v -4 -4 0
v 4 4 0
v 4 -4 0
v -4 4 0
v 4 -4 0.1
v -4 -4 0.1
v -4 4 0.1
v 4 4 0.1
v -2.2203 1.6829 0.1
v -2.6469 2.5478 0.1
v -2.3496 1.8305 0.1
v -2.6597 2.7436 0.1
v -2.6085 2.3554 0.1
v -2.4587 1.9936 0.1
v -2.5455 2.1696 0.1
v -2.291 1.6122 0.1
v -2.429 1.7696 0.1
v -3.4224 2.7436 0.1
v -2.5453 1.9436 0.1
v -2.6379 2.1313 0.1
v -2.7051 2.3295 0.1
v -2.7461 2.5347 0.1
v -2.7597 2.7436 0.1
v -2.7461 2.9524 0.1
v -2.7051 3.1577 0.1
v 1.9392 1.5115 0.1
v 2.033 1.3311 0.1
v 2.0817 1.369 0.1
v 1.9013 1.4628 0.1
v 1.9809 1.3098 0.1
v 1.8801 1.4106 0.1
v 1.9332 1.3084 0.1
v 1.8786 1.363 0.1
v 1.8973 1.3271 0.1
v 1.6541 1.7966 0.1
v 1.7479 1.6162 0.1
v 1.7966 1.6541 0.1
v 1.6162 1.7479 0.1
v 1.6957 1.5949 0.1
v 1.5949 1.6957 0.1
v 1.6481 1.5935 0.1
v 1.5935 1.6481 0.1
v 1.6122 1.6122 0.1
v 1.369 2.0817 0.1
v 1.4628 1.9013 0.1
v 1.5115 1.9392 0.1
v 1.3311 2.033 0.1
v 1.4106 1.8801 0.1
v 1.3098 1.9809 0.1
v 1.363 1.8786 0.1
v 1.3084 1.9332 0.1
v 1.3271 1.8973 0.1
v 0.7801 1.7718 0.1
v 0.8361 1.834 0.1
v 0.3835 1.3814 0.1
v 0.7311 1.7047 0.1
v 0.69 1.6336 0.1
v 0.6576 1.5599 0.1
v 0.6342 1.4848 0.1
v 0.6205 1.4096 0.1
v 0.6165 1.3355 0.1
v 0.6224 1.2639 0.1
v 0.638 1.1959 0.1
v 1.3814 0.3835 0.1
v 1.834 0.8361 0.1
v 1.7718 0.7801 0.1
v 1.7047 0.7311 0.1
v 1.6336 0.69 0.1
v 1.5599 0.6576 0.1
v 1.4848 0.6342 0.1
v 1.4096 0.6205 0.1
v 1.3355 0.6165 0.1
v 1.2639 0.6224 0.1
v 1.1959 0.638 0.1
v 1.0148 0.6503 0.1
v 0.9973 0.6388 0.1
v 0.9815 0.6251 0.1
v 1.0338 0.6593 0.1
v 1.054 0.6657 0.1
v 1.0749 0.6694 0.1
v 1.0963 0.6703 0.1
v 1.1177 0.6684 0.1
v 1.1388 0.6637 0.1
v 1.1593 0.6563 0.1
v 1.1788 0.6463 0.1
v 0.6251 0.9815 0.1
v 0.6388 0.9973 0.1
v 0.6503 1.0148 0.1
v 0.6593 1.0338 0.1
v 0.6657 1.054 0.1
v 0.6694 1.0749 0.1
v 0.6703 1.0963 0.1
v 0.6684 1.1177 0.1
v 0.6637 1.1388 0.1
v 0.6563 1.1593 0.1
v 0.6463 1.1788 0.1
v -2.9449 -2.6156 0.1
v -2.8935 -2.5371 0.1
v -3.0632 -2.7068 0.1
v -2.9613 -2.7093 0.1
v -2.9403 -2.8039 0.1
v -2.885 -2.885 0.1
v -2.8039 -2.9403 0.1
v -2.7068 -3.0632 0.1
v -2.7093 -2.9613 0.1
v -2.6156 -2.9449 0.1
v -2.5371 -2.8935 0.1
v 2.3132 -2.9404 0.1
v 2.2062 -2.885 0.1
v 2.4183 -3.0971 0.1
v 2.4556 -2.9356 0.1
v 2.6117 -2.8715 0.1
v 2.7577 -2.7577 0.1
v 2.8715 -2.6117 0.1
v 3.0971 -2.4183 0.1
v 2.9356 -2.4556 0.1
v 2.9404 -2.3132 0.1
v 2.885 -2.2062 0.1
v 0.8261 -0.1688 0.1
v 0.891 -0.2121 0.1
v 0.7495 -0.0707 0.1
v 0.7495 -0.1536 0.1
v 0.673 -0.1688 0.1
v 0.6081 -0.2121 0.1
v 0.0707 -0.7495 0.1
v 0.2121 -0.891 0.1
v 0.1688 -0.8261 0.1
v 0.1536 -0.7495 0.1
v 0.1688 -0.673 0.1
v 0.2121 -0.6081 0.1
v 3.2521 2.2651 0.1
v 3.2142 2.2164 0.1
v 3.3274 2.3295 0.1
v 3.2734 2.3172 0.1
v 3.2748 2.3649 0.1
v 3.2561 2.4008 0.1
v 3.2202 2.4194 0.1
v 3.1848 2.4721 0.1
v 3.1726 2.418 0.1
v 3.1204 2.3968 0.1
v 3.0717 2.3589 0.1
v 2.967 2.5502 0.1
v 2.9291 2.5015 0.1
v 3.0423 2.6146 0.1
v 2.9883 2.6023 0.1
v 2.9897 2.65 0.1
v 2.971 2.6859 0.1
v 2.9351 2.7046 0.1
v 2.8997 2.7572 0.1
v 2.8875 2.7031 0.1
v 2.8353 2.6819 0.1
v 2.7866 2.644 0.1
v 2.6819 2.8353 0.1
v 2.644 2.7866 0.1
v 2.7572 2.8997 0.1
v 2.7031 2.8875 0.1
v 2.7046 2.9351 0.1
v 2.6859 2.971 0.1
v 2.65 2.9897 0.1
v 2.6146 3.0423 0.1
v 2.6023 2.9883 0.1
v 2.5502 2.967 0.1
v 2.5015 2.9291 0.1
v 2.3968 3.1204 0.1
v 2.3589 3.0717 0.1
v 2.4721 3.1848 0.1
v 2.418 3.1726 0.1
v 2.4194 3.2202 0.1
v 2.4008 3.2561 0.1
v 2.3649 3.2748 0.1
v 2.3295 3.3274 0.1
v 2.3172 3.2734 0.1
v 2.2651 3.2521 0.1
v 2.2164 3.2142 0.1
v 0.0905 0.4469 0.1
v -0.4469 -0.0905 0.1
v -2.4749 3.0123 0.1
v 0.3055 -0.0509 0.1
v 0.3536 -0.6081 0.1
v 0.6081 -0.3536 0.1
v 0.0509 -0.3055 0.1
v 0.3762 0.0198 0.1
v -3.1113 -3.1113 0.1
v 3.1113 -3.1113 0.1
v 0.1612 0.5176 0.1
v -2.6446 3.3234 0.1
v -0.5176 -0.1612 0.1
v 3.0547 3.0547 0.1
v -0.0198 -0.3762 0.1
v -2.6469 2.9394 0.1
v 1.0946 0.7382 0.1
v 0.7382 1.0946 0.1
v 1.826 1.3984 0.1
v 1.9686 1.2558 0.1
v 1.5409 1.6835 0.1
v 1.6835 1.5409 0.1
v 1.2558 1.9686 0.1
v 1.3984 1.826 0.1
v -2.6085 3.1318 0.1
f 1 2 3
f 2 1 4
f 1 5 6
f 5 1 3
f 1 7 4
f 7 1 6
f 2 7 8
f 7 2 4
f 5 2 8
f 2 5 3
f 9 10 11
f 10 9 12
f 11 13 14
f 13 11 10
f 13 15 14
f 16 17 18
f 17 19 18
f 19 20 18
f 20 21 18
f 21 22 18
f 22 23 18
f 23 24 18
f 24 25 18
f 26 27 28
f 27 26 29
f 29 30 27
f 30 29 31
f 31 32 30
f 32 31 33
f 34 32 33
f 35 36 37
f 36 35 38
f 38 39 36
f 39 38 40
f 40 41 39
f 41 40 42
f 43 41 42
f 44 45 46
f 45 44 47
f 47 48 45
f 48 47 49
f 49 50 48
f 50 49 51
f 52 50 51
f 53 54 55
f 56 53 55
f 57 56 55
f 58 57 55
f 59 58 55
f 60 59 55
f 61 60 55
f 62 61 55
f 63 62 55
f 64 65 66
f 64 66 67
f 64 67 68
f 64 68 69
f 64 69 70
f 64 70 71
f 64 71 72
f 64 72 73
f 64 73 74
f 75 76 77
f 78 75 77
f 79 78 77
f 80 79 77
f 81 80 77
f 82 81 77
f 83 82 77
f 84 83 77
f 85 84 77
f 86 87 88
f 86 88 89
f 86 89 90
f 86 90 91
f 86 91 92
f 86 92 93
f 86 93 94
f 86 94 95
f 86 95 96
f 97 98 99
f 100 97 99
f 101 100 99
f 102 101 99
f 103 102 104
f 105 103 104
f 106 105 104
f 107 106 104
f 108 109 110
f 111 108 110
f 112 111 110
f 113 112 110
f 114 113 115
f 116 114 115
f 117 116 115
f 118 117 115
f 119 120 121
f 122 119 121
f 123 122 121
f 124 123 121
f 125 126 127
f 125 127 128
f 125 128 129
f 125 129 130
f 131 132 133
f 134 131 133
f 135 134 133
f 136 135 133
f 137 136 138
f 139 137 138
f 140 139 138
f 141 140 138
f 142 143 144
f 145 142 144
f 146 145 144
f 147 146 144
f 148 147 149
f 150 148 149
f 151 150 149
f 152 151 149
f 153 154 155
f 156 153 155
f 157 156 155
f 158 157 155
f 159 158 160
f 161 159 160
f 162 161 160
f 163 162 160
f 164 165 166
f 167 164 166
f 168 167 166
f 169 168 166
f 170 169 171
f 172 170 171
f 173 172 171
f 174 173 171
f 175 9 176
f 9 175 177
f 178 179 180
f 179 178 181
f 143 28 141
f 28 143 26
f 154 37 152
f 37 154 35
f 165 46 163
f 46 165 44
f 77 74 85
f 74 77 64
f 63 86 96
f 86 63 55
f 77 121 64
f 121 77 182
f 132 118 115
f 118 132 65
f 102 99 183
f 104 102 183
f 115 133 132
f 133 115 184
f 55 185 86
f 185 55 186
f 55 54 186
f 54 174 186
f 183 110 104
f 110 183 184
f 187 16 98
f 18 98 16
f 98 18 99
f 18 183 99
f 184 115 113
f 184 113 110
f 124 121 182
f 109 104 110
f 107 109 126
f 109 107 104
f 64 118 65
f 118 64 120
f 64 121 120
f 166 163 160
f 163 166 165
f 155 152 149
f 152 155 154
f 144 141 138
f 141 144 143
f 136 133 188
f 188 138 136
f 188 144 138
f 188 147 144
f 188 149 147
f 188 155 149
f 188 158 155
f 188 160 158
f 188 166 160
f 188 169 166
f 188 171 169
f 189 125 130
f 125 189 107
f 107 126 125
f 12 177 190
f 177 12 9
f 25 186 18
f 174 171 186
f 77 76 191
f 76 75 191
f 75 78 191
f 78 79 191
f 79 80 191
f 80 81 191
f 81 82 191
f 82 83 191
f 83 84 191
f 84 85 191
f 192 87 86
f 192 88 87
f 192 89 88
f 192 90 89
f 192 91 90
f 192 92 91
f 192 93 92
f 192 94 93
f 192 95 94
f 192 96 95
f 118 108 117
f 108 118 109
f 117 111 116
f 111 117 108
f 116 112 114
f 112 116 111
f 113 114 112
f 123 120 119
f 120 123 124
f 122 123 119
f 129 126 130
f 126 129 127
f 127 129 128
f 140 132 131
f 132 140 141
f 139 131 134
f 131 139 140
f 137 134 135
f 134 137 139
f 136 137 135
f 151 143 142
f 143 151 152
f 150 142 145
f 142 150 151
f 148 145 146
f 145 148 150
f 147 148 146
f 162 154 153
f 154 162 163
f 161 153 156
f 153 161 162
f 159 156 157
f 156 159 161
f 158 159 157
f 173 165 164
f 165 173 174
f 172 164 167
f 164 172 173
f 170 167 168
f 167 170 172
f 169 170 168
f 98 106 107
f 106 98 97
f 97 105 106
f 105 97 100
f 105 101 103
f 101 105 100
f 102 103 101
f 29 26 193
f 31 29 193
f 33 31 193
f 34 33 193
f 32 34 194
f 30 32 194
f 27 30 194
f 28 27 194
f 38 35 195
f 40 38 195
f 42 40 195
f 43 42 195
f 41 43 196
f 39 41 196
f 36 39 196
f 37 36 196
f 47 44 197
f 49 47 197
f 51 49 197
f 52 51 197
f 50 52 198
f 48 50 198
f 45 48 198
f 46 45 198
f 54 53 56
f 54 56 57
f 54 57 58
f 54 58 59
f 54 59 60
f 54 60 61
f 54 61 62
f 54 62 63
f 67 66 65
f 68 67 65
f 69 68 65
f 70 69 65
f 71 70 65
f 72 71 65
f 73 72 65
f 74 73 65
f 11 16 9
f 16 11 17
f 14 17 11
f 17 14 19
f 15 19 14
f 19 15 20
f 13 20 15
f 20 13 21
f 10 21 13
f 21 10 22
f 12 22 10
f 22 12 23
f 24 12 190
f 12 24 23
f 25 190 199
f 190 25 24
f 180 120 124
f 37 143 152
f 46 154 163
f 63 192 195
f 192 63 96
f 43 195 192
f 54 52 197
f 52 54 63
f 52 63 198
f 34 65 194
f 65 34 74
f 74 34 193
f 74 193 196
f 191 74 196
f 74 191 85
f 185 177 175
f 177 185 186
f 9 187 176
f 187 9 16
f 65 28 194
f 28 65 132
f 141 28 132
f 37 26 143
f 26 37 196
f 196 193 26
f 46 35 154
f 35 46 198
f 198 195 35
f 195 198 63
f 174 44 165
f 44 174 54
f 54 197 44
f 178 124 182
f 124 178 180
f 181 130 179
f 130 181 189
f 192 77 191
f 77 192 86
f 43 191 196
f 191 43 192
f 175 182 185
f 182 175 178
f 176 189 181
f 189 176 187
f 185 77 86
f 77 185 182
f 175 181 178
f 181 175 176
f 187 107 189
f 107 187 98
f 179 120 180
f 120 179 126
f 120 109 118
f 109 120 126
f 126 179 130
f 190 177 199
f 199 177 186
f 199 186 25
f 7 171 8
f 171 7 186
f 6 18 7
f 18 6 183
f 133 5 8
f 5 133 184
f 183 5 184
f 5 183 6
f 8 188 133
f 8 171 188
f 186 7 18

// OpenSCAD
// file: ../p/48/5-24ndis.scad
use <../../lib.scad>
function ldraw_lib__48__5_24ndis() = [
// 0 Hi-Res Disc Negative 0.2083
// 0 Name: 48\5-24ndis.dat
// 0 Author: Max Martin Richter [MMR1988]
// 0 !LDRAW_ORG 48_Primitive UPDATE 2015-01
// 0 !LICENSE Licensed under CC BY 2.0 and CC BY 4.0 : see CAreadme.txt
// 
// 0 BFC CERTIFY CCW
  [0,"BFC","CERTIFY"],
  [0,"BFC","CCW"],
// 
// 0 !HISTORY 2015-10-11 [PTadmin] Official Update 2015-01
// 
// 
// 3 16 1 0 1 0.9914 0 0.1305 1 0 0
  [3,16,1,0,1,0.9914,0,0.1305,1,0,0],
// 3 16 1 0 1 0.9659 0 0.2588 0.9914 0 0.1305
  [3,16,1,0,1,0.9659,0,0.2588,0.9914,0,0.1305],
// 3 16 1 0 1 0.9239 0 0.3827 0.9659 0 0.2588
  [3,16,1,0,1,0.9239,0,0.3827,0.9659,0,0.2588],
// 3 16 1 0 1 0.866 0 0.5 0.9239 0 0.3827
  [3,16,1,0,1,0.866,0,0.5,0.9239,0,0.3827],
// 3 16 1 0 1 0.7934 0 0.6088 0.866 0 0.5
  [3,16,1,0,1,0.7934,0,0.6088,0.866,0,0.5],
// 3 16 1 0 1 0.7071 0 0.7071 0.7934 0 0.6088
  [3,16,1,0,1,0.7071,0,0.7071,0.7934,0,0.6088],
// 3 16 1 0 1 0.6088 0 0.7934 0.7071 0 0.7071
  [3,16,1,0,1,0.6088,0,0.7934,0.7071,0,0.7071],
// 3 16 1 0 1 0.5 0 0.866 0.6088 0 0.7934
  [3,16,1,0,1,0.5,0,0.866,0.6088,0,0.7934],
// 3 16 1 0 1 0.3827 0 0.9239 0.5 0 0.866
  [3,16,1,0,1,0.3827,0,0.9239,0.5,0,0.866],
// 3 16 1 0 1 0.2588 0 0.9659 0.3827 0 0.9239
  [3,16,1,0,1,0.2588,0,0.9659,0.3827,0,0.9239],
// 0 // Build by Primitive Generator 2
];
makepoly(ldraw_lib__48__5_24ndis(), line=0.2);
// file: ../p/48/5-24chrd.scad
use <../../lib.scad>
function ldraw_lib__48__5_24chrd() = [
// 0 Hi-Res Chord 0.2083
// 0 Name: 48\5-24chrd.dat
// 0 Author: Alex Taylor [anathema]
// 0 !LDRAW_ORG 48_Primitive UPDATE 2009-03
// 0 !LICENSE Licensed under CC BY 2.0 and CC BY 4.0 : see CAreadme.txt
// 
// 0 BFC CERTIFY CCW
  [0,"BFC","CERTIFY"],
  [0,"BFC","CCW"],
// 
// 0 !HISTORY 2009-12-29 [PTadmin] Official Update 2009-03
// 
// 
// 3 16 1 0 0 0.9914 0 0.1305 0.9659 0 0.2588
  [3,16,1,0,0,0.9914,0,0.1305,0.9659,0,0.2588],
// 3 16 1 0 0 0.9659 0 0.2588 0.9239 0 0.3827
  [3,16,1,0,0,0.9659,0,0.2588,0.9239,0,0.3827],
// 3 16 1 0 0 0.9239 0 0.3827 0.866 0 0.5
  [3,16,1,0,0,0.9239,0,0.3827,0.866,0,0.5],
// 3 16 1 0 0 0.866 0 0.5 0.7934 0 0.6088
  [3,16,1,0,0,0.866,0,0.5,0.7934,0,0.6088],
// 3 16 1 0 0 0.7934 0 0.6088 0.7071 0 0.7071
  [3,16,1,0,0,0.7934,0,0.6088,0.7071,0,0.7071],
// 3 16 1 0 0 0.7071 0 0.7071 0.6088 0 0.7934
  [3,16,1,0,0,0.7071,0,0.7071,0.6088,0,0.7934],
// 3 16 1 0 0 0.6088 0 0.7934 0.5 0 0.866
  [3,16,1,0,0,0.6088,0,0.7934,0.5,0,0.866],
// 3 16 1 0 0 0.5 0 0.866 0.3827 0 0.9239
  [3,16,1,0,0,0.5,0,0.866,0.3827,0,0.9239],
// 3 16 1 0 0 0.3827 0 0.9239 0.2588 0 0.9659
  [3,16,1,0,0,0.3827,0,0.9239,0.2588,0,0.9659],
// 
// 0 end of file
// 
];
makepoly(ldraw_lib__48__5_24chrd(), line=0.2);
// file: ../p/48/3-16ndis.scad
use <../../lib.scad>
function ldraw_lib__48__3_16ndis() = [
// 0 Hi-Res Disc Negative 0.1875
// 0 Name: 48\3-16ndis.dat
// 0 Author: Bernd Broich [bbroich]
// 0 !LDRAW_ORG 48_Primitive UPDATE 2012-02
// 0 !LICENSE Licensed under CC BY 2.0 and CC BY 4.0 : see CAreadme.txt
// 
// 0 BFC CERTIFY CCW
  [0,"BFC","CERTIFY"],
  [0,"BFC","CCW"],
// 
// 0 !HISTORY 2004-04-22 [PTadmin] Official Update 2004-02
// 0 !HISTORY 2007-06-24 [PTadmin] Header formatted for Contributor Agreement
// 0 !HISTORY 2008-07-01 [PTadmin] Official Update 2008-01
// 0 !HISTORY 2012-02-27 [Philo] Changed to CCW
// 0 !HISTORY 2012-08-09 [PTadmin] Official Update 2012-02
// 
// 
// 3 16 0.9914 0 0.1305 1 0 0 1 0 1
  [3,16,0.9914,0,0.1305,1,0,0,1,0,1],
// 3 16 0.9659 0 0.2588 0.9914 0 0.1305 1 0 1
  [3,16,0.9659,0,0.2588,0.9914,0,0.1305,1,0,1],
// 3 16 0.9239 0 0.3827 0.9659 0 0.2588 1 0 1
  [3,16,0.9239,0,0.3827,0.9659,0,0.2588,1,0,1],
// 3 16 0.866 0 0.5 0.9239 0 0.3827 1 0 1
  [3,16,0.866,0,0.5,0.9239,0,0.3827,1,0,1],
// 3 16 0.7934 0 0.6088 0.866 0 0.5 1 0 1
  [3,16,0.7934,0,0.6088,0.866,0,0.5,1,0,1],
// 3 16 0.7071 0 0.7071 0.7934 0 0.6088 1 0 1
  [3,16,0.7071,0,0.7071,0.7934,0,0.6088,1,0,1],
// 3 16 0.6088 0 0.7934 0.7071 0 0.7071 1 0 1
  [3,16,0.6088,0,0.7934,0.7071,0,0.7071,1,0,1],
// 3 16 0.5 0 0.866 0.6088 0 0.7934 1 0 1
  [3,16,0.5,0,0.866,0.6088,0,0.7934,1,0,1],
// 3 16 0.3827 0 0.9239 0.5 0 0.866 1 0 1
  [3,16,0.3827,0,0.9239,0.5,0,0.866,1,0,1],
];
makepoly(ldraw_lib__48__3_16ndis(), line=0.2);
// file: ../p/48/3-16chrd.scad
use <../../lib.scad>
function ldraw_lib__48__3_16chrd() = [
// 0 Hi-Res Chord 0.1875
// 0 Name: 48\3-16chrd.dat
// 0 Author: Magnus Forsberg [MagFors]
// 0 !LDRAW_ORG 48_Primitive UPDATE 2011-02
// 0 !LICENSE Licensed under CC BY 2.0 and CC BY 4.0 : see CAreadme.txt
// 
// 0 BFC CERTIFY CCW
  [0,"BFC","CERTIFY"],
  [0,"BFC","CCW"],
// 
// 0 !HISTORY 2011-12-29 [PTadmin] Official Update 2011-02
// 
// 
// 3 16 1 0 0 0.9914 0 0.1305 0.9659 0 0.2588
  [3,16,1,0,0,0.9914,0,0.1305,0.9659,0,0.2588],
// 3 16 1 0 0 0.9659 0 0.2588 0.9239 0 0.3827
  [3,16,1,0,0,0.9659,0,0.2588,0.9239,0,0.3827],
// 3 16 1 0 0 0.9239 0 0.3827 0.866 0 0.5
  [3,16,1,0,0,0.9239,0,0.3827,0.866,0,0.5],
// 3 16 1 0 0 0.866 0 0.5 0.7934 0 0.6088
  [3,16,1,0,0,0.866,0,0.5,0.7934,0,0.6088],
// 3 16 1 0 0 0.7934 0 0.6088 0.7071 0 0.7071
  [3,16,1,0,0,0.7934,0,0.6088,0.7071,0,0.7071],
// 3 16 1 0 0 0.7071 0 0.7071 0.6088 0 0.7934
  [3,16,1,0,0,0.7071,0,0.7071,0.6088,0,0.7934],
// 3 16 1 0 0 0.6088 0 0.7934 0.5 0 0.866
  [3,16,1,0,0,0.6088,0,0.7934,0.5,0,0.866],
// 3 16 1 0 0 0.5 0 0.866 0.3827 0 0.9239
  [3,16,1,0,0,0.5,0,0.866,0.3827,0,0.9239],
// 0 // Build by Primitive Generator 2
];
makepoly(ldraw_lib__48__3_16chrd(), line=0.2);
// file: ../p/48/1-8chrd.scad
use <../../lib.scad>
function ldraw_lib__48__1_8chrd() = [
// 0 Hi-Res Chord 0.125
// 0 Name: 48\1-8chrd.dat
// 0 Author: Guy Vivan [guyvivan]
// 0 !LDRAW_ORG 48_Primitive UPDATE 2009-01
// 0 !LICENSE Licensed under CC BY 2.0 and CC BY 4.0 : see CAreadme.txt
// 
// 0 BFC CERTIFY CCW
  [0,"BFC","CERTIFY"],
  [0,"BFC","CCW"],
// 
// 0 !HISTORY 2009-05-02 [PTadmin] Official Update 2009-01
// 
// 
// 4 16 1 0 0 0.9914 0 0.1305 0.7934 0 0.6088 0.7071 0 0.7071
  [4,16,1,0,0,0.9914,0,0.1305,0.7934,0,0.6088,0.7071,0,0.7071],
// 4 16 0.9914 0 0.1305 0.9659 0 0.2588 0.866 0 0.5 0.7934 0 0.6088
  [4,16,0.9914,0,0.1305,0.9659,0,0.2588,0.866,0,0.5,0.7934,0,0.6088],
// 3 16 0.9659 0 0.2588 0.9239 0 0.3827 0.866 0 0.5
  [3,16,0.9659,0,0.2588,0.9239,0,0.3827,0.866,0,0.5],
// 0
];
makepoly(ldraw_lib__48__1_8chrd(), line=0.2);
// file: ../p/48/1-6ring15.scad
use <../../lib.scad>
function ldraw_lib__48__1_6ring15() = [
// 0 Hi-Res Ring 15 x 0.1667
// 0 Name: 48\1-6ring15.dat
// 0 Author: Max Martin Richter [MMR1988]
// 0 !LDRAW_ORG 48_Primitive UPDATE 2019-02
// 0 !LICENSE Licensed under CC BY 2.0 and CC BY 4.0 : see CAreadme.txt
// 
// 0 BFC CERTIFY CCW
  [0,"BFC","CERTIFY"],
  [0,"BFC","CCW"],
// 
// 0 !HISTORY 2019-09-09 [PTadmin] Official Update 2019-02
// 
// 
// 4 16 16 0 0 15.8624 0 2.088 14.871 0 1.9575 15 0 0
  [4,16,16,0,0,15.8624,0,2.088,14.871,0,1.9575,15,0,0],
// 4 16 15.8624 0 2.088 15.4544 0 4.1408 14.4885 0 3.882 14.871 0 1.9575
  [4,16,15.8624,0,2.088,15.4544,0,4.1408,14.4885,0,3.882,14.871,0,1.9575],
// 4 16 15.4544 0 4.1408 14.7824 0 6.1232 13.8585 0 5.7405 14.4885 0 3.882
  [4,16,15.4544,0,4.1408,14.7824,0,6.1232,13.8585,0,5.7405,14.4885,0,3.882],
// 4 16 14.7824 0 6.1232 13.856 0 8 12.99 0 7.5 13.8585 0 5.7405
  [4,16,14.7824,0,6.1232,13.856,0,8,12.99,0,7.5,13.8585,0,5.7405],
// 4 16 13.856 0 8 12.6944 0 9.7408 11.901 0 9.132 12.99 0 7.5
  [4,16,13.856,0,8,12.6944,0,9.7408,11.901,0,9.132,12.99,0,7.5],
// 4 16 12.6944 0 9.7408 11.3136 0 11.3136 10.6065 0 10.6065 11.901 0 9.132
  [4,16,12.6944,0,9.7408,11.3136,0,11.3136,10.6065,0,10.6065,11.901,0,9.132],
// 4 16 11.3136 0 11.3136 9.7408 0 12.6944 9.132 0 11.901 10.6065 0 10.6065
  [4,16,11.3136,0,11.3136,9.7408,0,12.6944,9.132,0,11.901,10.6065,0,10.6065],
// 4 16 9.7408 0 12.6944 8 0 13.856 7.5 0 12.99 9.132 0 11.901
  [4,16,9.7408,0,12.6944,8,0,13.856,7.5,0,12.99,9.132,0,11.901],
// 0 // Build by Primitive Generator 2
];
makepoly(ldraw_lib__48__1_6ring15(), line=0.2);
// file: ../p/48/1-6ndis.scad
use <../../lib.scad>
function ldraw_lib__48__1_6ndis() = [
// 0 Hi-Res Disc Negative 0.1667
// 0 Name: 48\1-6ndis.dat
// 0 Author: Alex Taylor [anathema]
// 0 !LDRAW_ORG 48_Primitive UPDATE 2010-02
// 0 !LICENSE Licensed under CC BY 2.0 and CC BY 4.0 : see CAreadme.txt
// 
// 0 BFC CERTIFY CCW
  [0,"BFC","CERTIFY"],
  [0,"BFC","CCW"],
// 
// 0 !HISTORY 2010-07-05 [PTadmin] Official Update 2010-02
// 
// 
// 3 16 1 0 1 0.9914 0 0.1305 1 0 0
  [3,16,1,0,1,0.9914,0,0.1305,1,0,0],
// 3 16 1 0 1 0.9659 0 0.2588 0.9914 0 0.1305
  [3,16,1,0,1,0.9659,0,0.2588,0.9914,0,0.1305],
// 3 16 1 0 1 0.9239 0 0.3827 0.9659 0 0.2588
  [3,16,1,0,1,0.9239,0,0.3827,0.9659,0,0.2588],
// 3 16 1 0 1 0.866 0 0.5 0.9239 0 0.3827
  [3,16,1,0,1,0.866,0,0.5,0.9239,0,0.3827],
// 3 16 1 0 1 0.7934 0 0.6088 0.866 0 0.5
  [3,16,1,0,1,0.7934,0,0.6088,0.866,0,0.5],
// 3 16 1 0 1 0.7071 0 0.7071 0.7934 0 0.6088
  [3,16,1,0,1,0.7071,0,0.7071,0.7934,0,0.6088],
// 3 16 1 0 1 0.6088 0 0.7934 0.7071 0 0.7071
  [3,16,1,0,1,0.6088,0,0.7934,0.7071,0,0.7071],
// 3 16 1 0 1 0.5 0 0.866 0.6088 0 0.7934
  [3,16,1,0,1,0.5,0,0.866,0.6088,0,0.7934],
// 0
];
makepoly(ldraw_lib__48__1_6ndis(), line=0.2);
// file: ../p/2-4ndis.scad
use <../lib.scad>
function ldraw_lib__2_4ndis() = [
// 0 Disc Negative 0.5
// 0 Name: 2-4ndis.dat
// 0 Author: James Jessiman
// 0 !LDRAW_ORG Primitive UPDATE 2012-01
// 0 !LICENSE Licensed under CC BY 2.0 and CC BY 4.0 : see CAreadme.txt
// 
// 0 BFC CERTIFY CCW
  [0,"BFC","CERTIFY"],
  [0,"BFC","CCW"],
// 
// 0 !HISTORY 2002-03-23 [sbliss] Added BFC statement; compacted code
// 0 !HISTORY 2002-04-25 [PTadmin] Official Update 2002-02
// 0 !HISTORY 2007-06-24 [PTadmin] Header formatted for Contributor Agreement
// 0 !HISTORY 2008-07-01 [PTadmin] Official Update 2008-01
// 0 !HISTORY 2012-02-16 [Philo] Changed to CCW
// 0 !HISTORY 2012-03-30 [PTadmin] Official Update 2012-01
// 
// 
// 3 16 0.9239 0 0.3827 1 0 0 1 0 1
  [3,16,0.9239,0,0.3827,1,0,0,1,0,1],
// 3 16 0.7071 0 0.7071 0.9239 0 0.3827 1 0 1
  [3,16,0.7071,0,0.7071,0.9239,0,0.3827,1,0,1],
// 3 16 0.3827 0 0.9239 0.7071 0 0.7071 1 0 1
  [3,16,0.3827,0,0.9239,0.7071,0,0.7071,1,0,1],
// 3 16 0 0 1 0.3827 0 0.9239 1 0 1
  [3,16,0,0,1,0.3827,0,0.9239,1,0,1],
// 3 16 -0.3827 0 0.9239 0 0 1 -1 0 1
  [3,16,-0.3827,0,0.9239,0,0,1,-1,0,1],
// 3 16 -0.7071 0 0.7071 -0.3827 0 0.9239 -1 0 1
  [3,16,-0.7071,0,0.7071,-0.3827,0,0.9239,-1,0,1],
// 3 16 -0.9239 0 0.3827 -0.7071 0 0.7071 -1 0 1
  [3,16,-0.9239,0,0.3827,-0.7071,0,0.7071,-1,0,1],
// 3 16 -1 0 0 -0.9239 0 0.3827 -1 0 1
  [3,16,-1,0,0,-0.9239,0,0.3827,-1,0,1],
];
makepoly(ldraw_lib__2_4ndis(), line=0.2);
// file: ../p/2-4chrd.scad
use <../lib.scad>
function ldraw_lib__2_4chrd() = [
// 0 Chord 0.5
// 0 Name: 2-4chrd.dat
// 0 Author: Philippe Hurbain [Philo]
// 0 !LDRAW_ORG Primitive UPDATE 2014-01
// 0 !LICENSE Licensed under CC BY 2.0 and CC BY 4.0 : see CAreadme.txt
// 
// 0 BFC CERTIFY CCW
  [0,"BFC","CERTIFY"],
  [0,"BFC","CCW"],
// 
// 0 !HISTORY 2014-06-21 [PTadmin] Official Update 2014-01
// 
// 
// 4 16 0.9239 0 0.3827 -0.9239 0 0.3827 -1 0 0 1 0 0
  [4,16,0.9239,0,0.3827,-0.9239,0,0.3827,-1,0,0,1,0,0],
// 4 16 0.7071 0 0.7071 -0.7071 0 0.7071 -0.9239 0 0.3827 0.9239 0 0.3827
  [4,16,0.7071,0,0.7071,-0.7071,0,0.7071,-0.9239,0,0.3827,0.9239,0,0.3827],
// 4 16 0.3827 0 0.9239 -0.3827 0 0.9239 -0.7071 0 0.7071 0.7071 0 0.7071
  [4,16,0.3827,0,0.9239,-0.3827,0,0.9239,-0.7071,0,0.7071,0.7071,0,0.7071],
// 3 16 0 0 1 -0.3827 0 0.9239 0.3827 0 0.9239
  [3,16,0,0,1,-0.3827,0,0.9239,0.3827,0,0.9239],
];
makepoly(ldraw_lib__2_4chrd(), line=0.2);
// file: ../p/1-4ndis.scad
use <../lib.scad>
function ldraw_lib__1_4ndis() = [
// 0 Disc Negative 0.25
// 0 Name: 1-4ndis.dat
// 0 Author: James Jessiman
// 0 !LDRAW_ORG Primitive UPDATE 2012-01
// 0 !LICENSE Licensed under CC BY 2.0 and CC BY 4.0 : see CAreadme.txt
// 
// 0 BFC CERTIFY CCW
  [0,"BFC","CERTIFY"],
  [0,"BFC","CCW"],
// 
// 0 !HISTORY 2002-03-23 [sbliss] Added BFC Statement
// 0 !HISTORY 2002-04-25 [PTadmin] Official Update 2002-02
// 0 !HISTORY 2007-06-22 [PTadmin] Header formatted for Contributor Agreement
// 0 !HISTORY 2008-07-01 [PTadmin] Official Update 2008-01
// 0 !HISTORY 2012-02-16 [Philo] Changed to CCW
// 0 !HISTORY 2012-03-30 [PTadmin] Official Update 2012-01
// 
// 
// 3 16 0.9239 0 0.3827 1 0 0 1 0 1
  [3,16,0.9239,0,0.3827,1,0,0,1,0,1],
// 3 16 0.7071 0 0.7071 0.9239 0 0.3827 1 0 1
  [3,16,0.7071,0,0.7071,0.9239,0,0.3827,1,0,1],
// 3 16 0.3827 0 0.9239 0.7071 0 0.7071 1 0 1
  [3,16,0.3827,0,0.9239,0.7071,0,0.7071,1,0,1],
// 3 16 0 0 1 0.3827 0 0.9239 1 0 1
  [3,16,0,0,1,0.3827,0,0.9239,1,0,1],
];
makepoly(ldraw_lib__1_4ndis(), line=0.2);
// file: ../p/1-4chrd.scad
use <../lib.scad>
function ldraw_lib__1_4chrd() = [
// 0 Chord 0.25
// 0 Name: 1-4chrd.dat
// 0 Author: Tony Hafner [hafhead]
// 0 !LDRAW_ORG Primitive UPDATE 2012-02
// 0 !LICENSE Licensed under CC BY 2.0 and CC BY 4.0 : see CAreadme.txt
// 
// 0 BFC CERTIFY CCW
  [0,"BFC","CERTIFY"],
  [0,"BFC","CCW"],
// 
// 0 !HISTORY 2004-04-22 [PTadmin] Official Update 2004-02
// 0 !HISTORY 2007-10-09 [PTadmin] Header formatted for Contributor Agreement
// 0 !HISTORY 2008-07-01 [PTadmin] Official Update 2008-01
// 0 !HISTORY 2012-08-02 [MMR1988] Re-creation with PrimGen2 and Rectifier
// 0 !HISTORY 2012-08-09 [PTadmin] Official Update 2012-02
// 
// 
// 4 16 0.9239 0 0.3827 0.3827 0 0.9239 0 0 1 1 0 0
  [4,16,0.9239,0,0.3827,0.3827,0,0.9239,0,0,1,1,0,0],
// 3 16 0.7071 0 0.7071 0.3827 0 0.9239 0.9239 0 0.3827
  [3,16,0.7071,0,0.7071,0.3827,0,0.9239,0.9239,0,0.3827],
];
makepoly(ldraw_lib__1_4chrd(), line=0.2);
// file: ../p/box5-12.scad
use <../lib.scad>
function ldraw_lib__box5_12() = [
// 0 Box with 5 Faces without Any Edges
// 0 Name: box5-12.dat
// 0 Author: Chris Dee [cwdee]
// 0 !LDRAW_ORG Primitive UPDATE 2009-02
// 0 !LICENSE Licensed under CC BY 2.0 and CC BY 4.0 : see CAreadme.txt
// 
// 0 BFC CERTIFY CCW
  [0,"BFC","CERTIFY"],
  [0,"BFC","CCW"],
// 
// 0 !HISTORY 2009-09-03 [PTadmin] Official Update 2009-02
// 
// 
// 4 16 1 1 1 1 1 -1 -1 1 -1 -1 1 1
  [4,16,1,1,1,1,1,-1,-1,1,-1,-1,1,1],
// 4 16 -1 0 1 1 0 1 1 1 1 -1 1 1
  [4,16,-1,0,1,1,0,1,1,1,1,-1,1,1],
// 4 16 -1 0 -1 -1 0 1 -1 1 1 -1 1 -1
  [4,16,-1,0,-1,-1,0,1,-1,1,1,-1,1,-1],
// 4 16 1 0 -1 -1 0 -1 -1 1 -1 1 1 -1
  [4,16,1,0,-1,-1,0,-1,-1,1,-1,1,1,-1],
// 4 16 1 0 1 1 0 -1 1 1 -1 1 1 1
  [4,16,1,0,1,1,0,-1,1,1,-1,1,1,1],
// 0
];
makepoly(ldraw_lib__box5_12(), line=0.2);
// main file
use <../lib.scad>
use <../p/box5-12.scad>
use <s/196955cs01.scad>
function ldraw_lib__196955c() = [
// 0 Sticker  1.0 x  1.0 with Crossed Knife and Fork
// 0 Name: 196955c.dat
// 0 Author: Ulrich Röder [UR]
// 0 !LDRAW_ORG Part UPDATE 2020-03
// 0 !LICENSE Licensed under CC BY 2.0 and CC BY 4.0 : see CAreadme.txt
// 
// 0 BFC CERTIFY CCW
  [0,"BFC","CERTIFY"],
  [0,"BFC","CCW"],
// 
// 0 !KEYWORDS Set 7745, Train
// 
// 0 !CMDLINE -c15
// 
// 0 !HISTORY 2019-09-09 [PTadmin] Official Update 2019-02
// 0 !HISTORY 2020-08-25 [cwdee] Update description
// 0 !HISTORY 2020-12-29 [PTadmin] Official Update 2020-03
// 
// 
// 0 // Main
// 
// 1 16 0 -.25 0 10 0 0 0 .25 0 0 0 -10 box5-12.dat
  [1,16,0,-.25,0,10,0,0,0,.25,0,0,0,-10, ldraw_lib__box5_12()],
// 1 15 0 -.25 0 .70711 0 .70711 0 1 0 -.70711 0 .70711 s\196955cs01.dat
  [1,15,0,-.25,0,.70711,0,.70711,0,1,0,-.70711,0,.70711, ldraw_lib__s__196955cs01()],
// 4 15 -10 -.25 10 -6.6114785 -.25 8.3085425 5.82375796 -.25 8.31844204 10 -.25 10
  [4,15,-10,-.25,10,-6.6114785,-.25,8.3085425,5.82375796,-.25,8.31844204,10,-.25,10],
// 4 15 -10 -.25 10 -10 -.25 -10 -7.77821 -.25 -7.77821 -8.556031 -.25 6.858967
  [4,15,-10,-.25,10,-10,-.25,-10,-7.77821,-.25,-7.77821,-8.556031,-.25,6.858967],
// 4 15 7.77821 -.25 -7.77821 10 -.25 -10 10 -.25 10 8.31844204 -.25 5.82375796
  [4,15,7.77821,-.25,-7.77821,10,-.25,-10,10,-.25,10,8.31844204,-.25,5.82375796],
// 4 15 -10 -.25 -10 10 -.25 -10 7.77821 -.25 -7.77821 -7.77821 -.25 -7.77821
  [4,15,-10,-.25,-10,10,-.25,-10,7.77821,-.25,-7.77821,-7.77821,-.25,-7.77821],
// 3 15 10 -.25 10 7.636788 -.25 7.636788 8.31844204 -.25 5.82375796
  [3,15,10,-.25,10,7.636788,-.25,7.636788,8.31844204,-.25,5.82375796],
// 3 15 10 -.25 10 5.82375796 -.25 8.31844204 7.636788 -.25 7.636788
  [3,15,10,-.25,10,5.82375796,-.25,8.31844204,7.636788,-.25,7.636788],
// 3 15 -6.6114785 -.25 8.3085425 -10 -.25 10 -8.556031 -.25 6.858967
  [3,15,-6.6114785,-.25,8.3085425,-10,-.25,10,-8.556031,-.25,6.858967],
];
makepoly(ldraw_lib__196955c(), line=0.2);
